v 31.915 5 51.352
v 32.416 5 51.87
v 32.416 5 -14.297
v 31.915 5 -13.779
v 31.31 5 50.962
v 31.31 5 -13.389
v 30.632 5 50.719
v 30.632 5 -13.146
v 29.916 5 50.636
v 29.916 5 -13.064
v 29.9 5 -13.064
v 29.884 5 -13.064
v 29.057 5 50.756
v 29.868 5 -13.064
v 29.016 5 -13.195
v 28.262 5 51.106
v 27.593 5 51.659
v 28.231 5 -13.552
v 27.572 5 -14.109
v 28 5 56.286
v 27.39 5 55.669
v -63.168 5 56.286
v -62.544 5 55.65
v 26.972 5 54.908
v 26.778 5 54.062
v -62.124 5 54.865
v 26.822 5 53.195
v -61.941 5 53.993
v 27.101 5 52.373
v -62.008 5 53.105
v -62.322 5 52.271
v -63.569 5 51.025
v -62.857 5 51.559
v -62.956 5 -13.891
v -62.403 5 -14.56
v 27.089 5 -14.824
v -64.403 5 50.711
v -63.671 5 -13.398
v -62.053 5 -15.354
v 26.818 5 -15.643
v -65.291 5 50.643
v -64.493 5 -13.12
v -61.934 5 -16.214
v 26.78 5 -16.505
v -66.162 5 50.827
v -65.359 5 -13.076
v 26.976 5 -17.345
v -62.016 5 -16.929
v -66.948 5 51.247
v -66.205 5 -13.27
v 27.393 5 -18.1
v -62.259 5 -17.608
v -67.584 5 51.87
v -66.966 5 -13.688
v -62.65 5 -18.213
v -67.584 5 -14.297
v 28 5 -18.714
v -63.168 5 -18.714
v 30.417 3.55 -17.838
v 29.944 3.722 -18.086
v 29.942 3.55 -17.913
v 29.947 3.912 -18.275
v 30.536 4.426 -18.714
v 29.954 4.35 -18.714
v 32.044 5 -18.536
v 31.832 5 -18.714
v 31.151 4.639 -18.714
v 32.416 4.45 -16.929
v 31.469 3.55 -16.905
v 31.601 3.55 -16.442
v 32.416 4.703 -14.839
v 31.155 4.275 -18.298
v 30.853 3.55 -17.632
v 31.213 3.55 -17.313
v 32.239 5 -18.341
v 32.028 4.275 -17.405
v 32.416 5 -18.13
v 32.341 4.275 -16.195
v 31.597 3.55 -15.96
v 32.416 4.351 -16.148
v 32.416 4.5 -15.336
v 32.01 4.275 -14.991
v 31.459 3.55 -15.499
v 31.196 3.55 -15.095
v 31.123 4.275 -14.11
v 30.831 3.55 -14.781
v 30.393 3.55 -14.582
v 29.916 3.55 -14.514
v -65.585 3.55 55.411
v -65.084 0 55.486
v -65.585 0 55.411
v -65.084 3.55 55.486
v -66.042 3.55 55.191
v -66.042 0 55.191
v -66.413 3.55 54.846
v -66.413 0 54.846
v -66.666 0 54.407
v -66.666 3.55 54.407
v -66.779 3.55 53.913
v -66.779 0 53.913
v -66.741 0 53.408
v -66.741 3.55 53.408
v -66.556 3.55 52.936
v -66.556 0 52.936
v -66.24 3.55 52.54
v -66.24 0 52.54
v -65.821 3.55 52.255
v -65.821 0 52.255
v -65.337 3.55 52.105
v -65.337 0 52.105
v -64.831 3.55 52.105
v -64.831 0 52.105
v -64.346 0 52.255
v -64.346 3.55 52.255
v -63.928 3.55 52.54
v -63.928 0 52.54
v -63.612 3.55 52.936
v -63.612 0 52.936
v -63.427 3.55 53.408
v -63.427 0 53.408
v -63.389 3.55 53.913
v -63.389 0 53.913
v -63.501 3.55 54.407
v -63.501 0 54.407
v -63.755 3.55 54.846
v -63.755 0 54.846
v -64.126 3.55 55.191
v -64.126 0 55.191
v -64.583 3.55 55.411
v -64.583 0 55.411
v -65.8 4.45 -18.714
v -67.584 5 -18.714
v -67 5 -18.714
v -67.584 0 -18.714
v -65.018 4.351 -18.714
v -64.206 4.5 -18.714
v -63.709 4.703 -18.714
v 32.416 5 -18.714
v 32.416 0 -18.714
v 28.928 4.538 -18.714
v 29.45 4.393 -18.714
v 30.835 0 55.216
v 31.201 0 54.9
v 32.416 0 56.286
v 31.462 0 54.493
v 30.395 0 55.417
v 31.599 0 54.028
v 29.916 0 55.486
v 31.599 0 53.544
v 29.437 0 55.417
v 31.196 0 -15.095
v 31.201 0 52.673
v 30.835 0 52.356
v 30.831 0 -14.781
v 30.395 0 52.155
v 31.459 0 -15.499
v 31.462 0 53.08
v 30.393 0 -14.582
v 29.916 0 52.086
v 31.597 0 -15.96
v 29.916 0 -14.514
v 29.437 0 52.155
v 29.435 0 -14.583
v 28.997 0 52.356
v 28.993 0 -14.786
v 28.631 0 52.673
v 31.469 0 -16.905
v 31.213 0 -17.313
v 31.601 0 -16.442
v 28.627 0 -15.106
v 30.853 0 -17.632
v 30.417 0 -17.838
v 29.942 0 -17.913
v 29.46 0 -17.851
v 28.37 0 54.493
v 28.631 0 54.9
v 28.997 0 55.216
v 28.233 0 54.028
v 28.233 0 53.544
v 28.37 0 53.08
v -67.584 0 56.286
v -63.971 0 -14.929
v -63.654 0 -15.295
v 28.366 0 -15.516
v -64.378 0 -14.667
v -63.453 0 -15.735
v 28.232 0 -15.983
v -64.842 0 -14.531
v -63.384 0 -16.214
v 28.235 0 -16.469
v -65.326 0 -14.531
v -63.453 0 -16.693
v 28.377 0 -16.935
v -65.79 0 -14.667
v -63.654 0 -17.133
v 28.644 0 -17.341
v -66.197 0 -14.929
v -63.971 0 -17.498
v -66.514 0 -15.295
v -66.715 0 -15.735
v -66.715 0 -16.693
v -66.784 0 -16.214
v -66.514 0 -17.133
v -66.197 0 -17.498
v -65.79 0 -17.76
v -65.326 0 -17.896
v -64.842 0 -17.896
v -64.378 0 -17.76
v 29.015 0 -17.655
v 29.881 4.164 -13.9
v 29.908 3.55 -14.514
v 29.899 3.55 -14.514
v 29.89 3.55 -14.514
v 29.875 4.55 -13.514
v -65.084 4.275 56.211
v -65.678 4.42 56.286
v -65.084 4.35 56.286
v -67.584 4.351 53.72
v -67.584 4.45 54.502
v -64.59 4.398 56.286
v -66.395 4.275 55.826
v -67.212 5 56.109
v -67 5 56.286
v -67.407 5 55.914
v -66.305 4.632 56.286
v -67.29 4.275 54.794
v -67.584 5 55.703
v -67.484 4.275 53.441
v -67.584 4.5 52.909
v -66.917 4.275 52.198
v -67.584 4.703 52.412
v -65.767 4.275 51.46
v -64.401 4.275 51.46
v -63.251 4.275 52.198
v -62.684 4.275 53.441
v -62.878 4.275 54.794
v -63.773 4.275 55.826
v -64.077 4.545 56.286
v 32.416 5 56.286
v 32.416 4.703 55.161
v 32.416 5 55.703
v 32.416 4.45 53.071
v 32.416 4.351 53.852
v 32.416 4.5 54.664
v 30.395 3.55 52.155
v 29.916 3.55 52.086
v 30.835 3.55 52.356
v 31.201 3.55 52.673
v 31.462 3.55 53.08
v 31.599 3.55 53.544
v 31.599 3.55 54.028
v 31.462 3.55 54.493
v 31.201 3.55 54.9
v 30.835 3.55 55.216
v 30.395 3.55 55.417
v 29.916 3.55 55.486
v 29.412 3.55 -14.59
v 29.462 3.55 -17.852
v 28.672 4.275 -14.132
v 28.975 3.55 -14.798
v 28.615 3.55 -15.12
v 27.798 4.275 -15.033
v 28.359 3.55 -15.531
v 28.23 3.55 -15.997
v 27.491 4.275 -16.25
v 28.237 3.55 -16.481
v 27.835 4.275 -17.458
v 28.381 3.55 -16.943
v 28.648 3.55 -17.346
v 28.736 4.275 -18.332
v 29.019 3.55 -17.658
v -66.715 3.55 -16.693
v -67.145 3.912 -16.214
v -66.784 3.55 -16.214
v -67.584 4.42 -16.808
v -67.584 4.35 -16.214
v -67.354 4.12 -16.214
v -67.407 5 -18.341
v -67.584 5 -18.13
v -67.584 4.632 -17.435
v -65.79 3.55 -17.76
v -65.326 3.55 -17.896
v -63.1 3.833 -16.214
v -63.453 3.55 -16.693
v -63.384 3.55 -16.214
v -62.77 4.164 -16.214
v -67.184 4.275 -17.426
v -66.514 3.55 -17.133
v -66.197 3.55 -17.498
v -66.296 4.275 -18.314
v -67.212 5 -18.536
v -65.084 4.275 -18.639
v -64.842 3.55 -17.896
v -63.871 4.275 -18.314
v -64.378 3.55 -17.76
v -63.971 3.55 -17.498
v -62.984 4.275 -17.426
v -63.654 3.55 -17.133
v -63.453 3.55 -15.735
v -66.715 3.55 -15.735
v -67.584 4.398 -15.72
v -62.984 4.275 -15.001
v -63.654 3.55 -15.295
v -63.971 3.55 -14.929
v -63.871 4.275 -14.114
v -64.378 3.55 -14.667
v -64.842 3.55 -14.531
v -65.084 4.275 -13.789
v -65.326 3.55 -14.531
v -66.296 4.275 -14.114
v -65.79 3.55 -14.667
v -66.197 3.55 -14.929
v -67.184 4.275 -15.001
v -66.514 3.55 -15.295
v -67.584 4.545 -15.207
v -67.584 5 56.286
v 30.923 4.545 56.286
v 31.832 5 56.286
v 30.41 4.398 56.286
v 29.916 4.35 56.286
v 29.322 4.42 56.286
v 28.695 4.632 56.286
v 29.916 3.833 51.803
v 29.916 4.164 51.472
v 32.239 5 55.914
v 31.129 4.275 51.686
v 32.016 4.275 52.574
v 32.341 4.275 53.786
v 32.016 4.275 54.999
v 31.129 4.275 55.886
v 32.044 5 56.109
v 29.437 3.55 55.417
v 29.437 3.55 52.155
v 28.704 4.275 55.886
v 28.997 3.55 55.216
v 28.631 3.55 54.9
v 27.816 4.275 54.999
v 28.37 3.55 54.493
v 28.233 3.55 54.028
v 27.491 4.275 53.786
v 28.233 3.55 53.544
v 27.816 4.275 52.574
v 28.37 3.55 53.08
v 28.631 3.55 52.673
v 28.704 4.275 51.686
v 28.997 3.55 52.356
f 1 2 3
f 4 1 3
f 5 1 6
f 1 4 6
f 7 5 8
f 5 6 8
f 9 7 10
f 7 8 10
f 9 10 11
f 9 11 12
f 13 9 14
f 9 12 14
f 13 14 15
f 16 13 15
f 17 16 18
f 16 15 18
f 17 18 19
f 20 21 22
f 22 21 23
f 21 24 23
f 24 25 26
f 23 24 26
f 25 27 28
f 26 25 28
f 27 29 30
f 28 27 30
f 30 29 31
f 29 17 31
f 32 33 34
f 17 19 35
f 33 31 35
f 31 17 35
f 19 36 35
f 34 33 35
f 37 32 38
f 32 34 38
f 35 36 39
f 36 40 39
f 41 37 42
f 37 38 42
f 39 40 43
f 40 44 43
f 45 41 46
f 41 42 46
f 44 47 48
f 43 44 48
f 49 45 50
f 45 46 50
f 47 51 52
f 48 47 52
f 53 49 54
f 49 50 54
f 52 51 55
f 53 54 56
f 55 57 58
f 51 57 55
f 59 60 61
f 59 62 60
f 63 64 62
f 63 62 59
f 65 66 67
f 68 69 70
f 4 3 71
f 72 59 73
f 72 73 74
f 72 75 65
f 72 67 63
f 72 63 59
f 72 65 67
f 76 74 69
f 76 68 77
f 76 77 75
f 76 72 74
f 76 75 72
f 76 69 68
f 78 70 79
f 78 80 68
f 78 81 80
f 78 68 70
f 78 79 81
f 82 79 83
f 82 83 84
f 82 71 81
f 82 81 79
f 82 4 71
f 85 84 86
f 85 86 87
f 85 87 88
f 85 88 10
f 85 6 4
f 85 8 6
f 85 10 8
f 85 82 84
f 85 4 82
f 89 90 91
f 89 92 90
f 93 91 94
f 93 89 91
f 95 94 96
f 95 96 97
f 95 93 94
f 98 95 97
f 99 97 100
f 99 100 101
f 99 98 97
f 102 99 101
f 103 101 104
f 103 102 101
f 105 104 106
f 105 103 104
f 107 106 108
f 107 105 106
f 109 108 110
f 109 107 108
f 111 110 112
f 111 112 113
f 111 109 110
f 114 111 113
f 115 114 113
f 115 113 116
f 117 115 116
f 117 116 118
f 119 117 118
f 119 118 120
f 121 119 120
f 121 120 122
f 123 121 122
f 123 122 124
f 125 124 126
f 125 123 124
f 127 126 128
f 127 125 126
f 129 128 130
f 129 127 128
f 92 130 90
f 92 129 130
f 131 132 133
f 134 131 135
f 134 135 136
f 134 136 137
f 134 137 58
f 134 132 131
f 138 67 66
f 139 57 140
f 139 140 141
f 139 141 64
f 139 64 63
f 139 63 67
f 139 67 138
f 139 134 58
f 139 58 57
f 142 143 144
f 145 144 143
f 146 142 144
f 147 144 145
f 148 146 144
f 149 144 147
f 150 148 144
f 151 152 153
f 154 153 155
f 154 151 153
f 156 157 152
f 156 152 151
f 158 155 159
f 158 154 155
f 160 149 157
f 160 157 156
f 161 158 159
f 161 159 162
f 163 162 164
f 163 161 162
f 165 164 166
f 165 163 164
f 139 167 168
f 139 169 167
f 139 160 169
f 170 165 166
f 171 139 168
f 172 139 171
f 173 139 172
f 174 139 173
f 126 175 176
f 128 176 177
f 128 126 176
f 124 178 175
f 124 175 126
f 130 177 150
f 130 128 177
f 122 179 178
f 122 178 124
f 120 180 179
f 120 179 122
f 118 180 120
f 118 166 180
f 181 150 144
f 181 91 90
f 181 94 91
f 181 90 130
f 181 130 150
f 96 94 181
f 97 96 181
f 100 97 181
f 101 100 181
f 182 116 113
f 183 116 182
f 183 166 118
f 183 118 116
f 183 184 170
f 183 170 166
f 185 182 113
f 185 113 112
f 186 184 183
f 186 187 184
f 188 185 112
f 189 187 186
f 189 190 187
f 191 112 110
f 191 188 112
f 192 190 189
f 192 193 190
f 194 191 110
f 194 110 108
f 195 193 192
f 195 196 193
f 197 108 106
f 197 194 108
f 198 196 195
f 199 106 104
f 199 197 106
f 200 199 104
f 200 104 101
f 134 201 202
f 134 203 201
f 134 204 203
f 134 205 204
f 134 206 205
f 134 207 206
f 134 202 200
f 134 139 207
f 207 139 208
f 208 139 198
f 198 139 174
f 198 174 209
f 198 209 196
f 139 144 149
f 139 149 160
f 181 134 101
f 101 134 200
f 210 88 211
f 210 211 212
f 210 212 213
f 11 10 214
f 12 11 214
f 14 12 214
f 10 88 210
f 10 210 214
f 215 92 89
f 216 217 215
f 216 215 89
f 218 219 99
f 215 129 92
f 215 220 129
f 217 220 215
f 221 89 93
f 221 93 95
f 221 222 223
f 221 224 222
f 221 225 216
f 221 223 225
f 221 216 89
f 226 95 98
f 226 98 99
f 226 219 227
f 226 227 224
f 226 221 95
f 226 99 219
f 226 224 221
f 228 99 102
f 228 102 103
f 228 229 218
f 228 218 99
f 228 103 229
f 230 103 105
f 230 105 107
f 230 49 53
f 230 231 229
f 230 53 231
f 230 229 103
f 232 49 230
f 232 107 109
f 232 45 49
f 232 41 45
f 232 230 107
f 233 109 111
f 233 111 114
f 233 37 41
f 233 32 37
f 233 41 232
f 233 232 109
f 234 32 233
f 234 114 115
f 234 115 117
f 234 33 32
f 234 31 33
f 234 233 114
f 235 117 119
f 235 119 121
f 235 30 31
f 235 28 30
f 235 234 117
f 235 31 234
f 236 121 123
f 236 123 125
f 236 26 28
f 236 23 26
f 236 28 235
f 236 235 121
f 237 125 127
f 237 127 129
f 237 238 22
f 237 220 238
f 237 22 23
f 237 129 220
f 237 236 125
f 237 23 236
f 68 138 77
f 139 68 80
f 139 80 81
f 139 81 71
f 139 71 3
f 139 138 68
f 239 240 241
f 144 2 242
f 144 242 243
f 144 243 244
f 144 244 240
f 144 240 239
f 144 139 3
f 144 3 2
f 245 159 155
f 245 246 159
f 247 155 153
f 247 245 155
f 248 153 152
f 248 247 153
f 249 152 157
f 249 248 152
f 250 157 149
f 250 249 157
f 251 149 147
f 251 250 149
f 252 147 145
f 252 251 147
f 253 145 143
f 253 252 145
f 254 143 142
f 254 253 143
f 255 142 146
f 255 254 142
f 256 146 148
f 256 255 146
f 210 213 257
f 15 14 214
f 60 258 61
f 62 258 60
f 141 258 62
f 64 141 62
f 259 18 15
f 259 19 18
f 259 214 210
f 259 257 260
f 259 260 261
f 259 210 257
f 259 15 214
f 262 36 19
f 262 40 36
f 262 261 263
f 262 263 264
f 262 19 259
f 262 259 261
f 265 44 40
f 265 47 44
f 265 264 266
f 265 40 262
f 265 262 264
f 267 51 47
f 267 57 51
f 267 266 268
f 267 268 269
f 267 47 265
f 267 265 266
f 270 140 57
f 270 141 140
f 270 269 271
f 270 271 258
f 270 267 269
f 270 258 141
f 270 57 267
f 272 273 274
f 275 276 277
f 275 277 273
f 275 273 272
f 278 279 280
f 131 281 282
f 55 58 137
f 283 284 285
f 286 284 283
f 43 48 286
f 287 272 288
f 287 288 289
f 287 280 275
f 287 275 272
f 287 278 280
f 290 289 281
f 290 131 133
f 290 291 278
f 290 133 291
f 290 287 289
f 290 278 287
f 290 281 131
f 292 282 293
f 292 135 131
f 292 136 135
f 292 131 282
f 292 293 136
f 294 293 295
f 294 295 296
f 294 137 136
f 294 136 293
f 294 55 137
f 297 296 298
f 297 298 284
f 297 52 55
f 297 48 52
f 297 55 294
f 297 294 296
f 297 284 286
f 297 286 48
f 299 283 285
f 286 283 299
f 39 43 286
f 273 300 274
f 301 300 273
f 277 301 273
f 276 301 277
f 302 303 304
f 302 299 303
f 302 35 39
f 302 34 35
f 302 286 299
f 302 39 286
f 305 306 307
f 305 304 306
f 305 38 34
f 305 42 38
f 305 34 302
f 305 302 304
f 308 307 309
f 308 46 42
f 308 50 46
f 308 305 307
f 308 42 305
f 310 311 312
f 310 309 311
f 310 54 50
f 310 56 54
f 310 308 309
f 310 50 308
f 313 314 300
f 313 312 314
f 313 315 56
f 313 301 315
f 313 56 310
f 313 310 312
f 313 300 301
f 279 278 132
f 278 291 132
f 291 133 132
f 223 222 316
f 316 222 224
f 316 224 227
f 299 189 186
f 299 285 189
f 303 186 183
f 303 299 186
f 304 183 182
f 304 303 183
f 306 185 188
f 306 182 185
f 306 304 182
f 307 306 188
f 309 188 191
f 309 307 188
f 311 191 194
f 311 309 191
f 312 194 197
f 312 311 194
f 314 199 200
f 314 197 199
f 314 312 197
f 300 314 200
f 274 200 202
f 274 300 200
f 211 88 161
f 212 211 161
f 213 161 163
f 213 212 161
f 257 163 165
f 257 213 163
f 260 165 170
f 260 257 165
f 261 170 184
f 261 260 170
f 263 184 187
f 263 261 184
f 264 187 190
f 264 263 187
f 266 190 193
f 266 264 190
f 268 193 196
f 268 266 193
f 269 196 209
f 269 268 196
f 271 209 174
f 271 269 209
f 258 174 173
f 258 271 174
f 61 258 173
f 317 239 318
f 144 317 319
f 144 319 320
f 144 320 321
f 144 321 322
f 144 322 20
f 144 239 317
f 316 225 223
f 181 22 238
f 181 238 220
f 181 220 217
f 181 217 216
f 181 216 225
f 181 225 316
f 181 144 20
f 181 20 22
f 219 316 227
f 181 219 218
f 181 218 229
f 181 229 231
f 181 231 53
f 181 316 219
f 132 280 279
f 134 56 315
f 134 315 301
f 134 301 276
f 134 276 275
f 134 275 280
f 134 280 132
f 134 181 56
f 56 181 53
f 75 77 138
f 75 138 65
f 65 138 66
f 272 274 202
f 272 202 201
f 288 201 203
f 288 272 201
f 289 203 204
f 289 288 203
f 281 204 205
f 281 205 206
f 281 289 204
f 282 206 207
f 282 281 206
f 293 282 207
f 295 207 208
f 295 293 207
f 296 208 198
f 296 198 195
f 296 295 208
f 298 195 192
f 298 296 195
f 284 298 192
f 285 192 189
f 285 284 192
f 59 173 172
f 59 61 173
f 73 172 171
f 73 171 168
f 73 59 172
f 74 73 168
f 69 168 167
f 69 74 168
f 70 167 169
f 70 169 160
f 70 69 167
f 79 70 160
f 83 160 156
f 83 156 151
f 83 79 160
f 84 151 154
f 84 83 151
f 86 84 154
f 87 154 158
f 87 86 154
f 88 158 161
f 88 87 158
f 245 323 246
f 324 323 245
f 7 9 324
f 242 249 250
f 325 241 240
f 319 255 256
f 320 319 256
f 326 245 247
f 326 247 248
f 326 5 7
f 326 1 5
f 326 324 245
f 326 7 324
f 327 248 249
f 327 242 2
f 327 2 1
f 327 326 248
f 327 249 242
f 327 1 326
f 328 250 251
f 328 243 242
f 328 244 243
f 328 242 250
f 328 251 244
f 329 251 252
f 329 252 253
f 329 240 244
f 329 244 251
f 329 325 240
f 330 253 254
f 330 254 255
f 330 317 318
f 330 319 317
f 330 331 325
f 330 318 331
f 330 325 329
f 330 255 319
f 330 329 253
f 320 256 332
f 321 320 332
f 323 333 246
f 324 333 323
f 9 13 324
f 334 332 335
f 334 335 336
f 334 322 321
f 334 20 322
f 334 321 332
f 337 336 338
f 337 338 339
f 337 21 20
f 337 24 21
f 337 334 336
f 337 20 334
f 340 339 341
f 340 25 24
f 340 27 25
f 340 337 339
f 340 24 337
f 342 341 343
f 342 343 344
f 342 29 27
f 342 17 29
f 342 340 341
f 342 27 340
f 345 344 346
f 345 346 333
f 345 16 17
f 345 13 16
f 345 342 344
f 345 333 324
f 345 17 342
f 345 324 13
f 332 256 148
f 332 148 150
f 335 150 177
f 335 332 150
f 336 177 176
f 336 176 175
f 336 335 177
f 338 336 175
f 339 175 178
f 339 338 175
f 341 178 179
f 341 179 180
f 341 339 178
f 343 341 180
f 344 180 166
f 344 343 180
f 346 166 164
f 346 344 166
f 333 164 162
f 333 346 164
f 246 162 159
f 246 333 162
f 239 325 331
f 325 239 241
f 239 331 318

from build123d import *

# Parameters (mm, degrees)
SALIENTE_EXTRUIR1_DEPTH                     = 5
AVELLANADO_PARA_TORNILLO_CON_CABEZA_3_COUNT = 2
AVELLANADO_PARA_TORNILLO_CON_CABEZA_3_PITCH = 70
AVELLANADO_PARA_TORNILLO_CON_CABEZA_4_COUNT = 2
AVELLANADO_PARA_TORNILLO_CON_CABEZA_4_PITCH = 118.00423721205946
AVELLANADO_PARA_TORNILLO_CON_CABEZA_5_COUNT = 2
AVELLANADO_PARA_TORNILLO_CON_CABEZA_5_PITCH = 95
AVELLANADO_PARA_TORNILLO_CON_CABEZA_6_COUNT = 2
AVELLANADO_PARA_TORNILLO_CON_CABEZA_6_PITCH = 69.99999670760137
AVELLANADO_PARA_TORNILLO_CON_CABEZA_7_COUNT = 2
AVELLANADO_PARA_TORNILLO_CON_CABEZA_7_PITCH = 118.00424590243654
AVELLANADO_PARA_TORNILLO_CON_CABEZA_8_COUNT = 2
AVELLANADO_PARA_TORNILLO_CON_CABEZA_8_PITCH = 95.00001009358513


with BuildPart() as part:
    # Croquis1 → Saliente-Extruir1 (new body)
    with BuildSketch(Plane(origin=(0, 0, 0), x_dir=(1, 0, 0), z_dir=(0, 1, 0))):
        Polygon((-67.58389261744966, 18.71364653243848), (32.41610738255034, 18.71364653243848), (32.41610738255035, -56.28635346756151), (-67.58389261744965, -56.28635346756151), align=None)
    extrude(amount=SALIENTE_EXTRUIR1_DEPTH)

    # Croquis3 → Avellanado para tornillo con cabeza plana avellanada de M31 (revolve, cut)
    with BuildSketch(Plane(origin=(-65.08389261744965, 5, 53.78635346756151), x_dir=(0, 0, 1), z_dir=(1, 0, 0))):
        Polygon((0, 0), (-1.22e-15, 5.000000000000001), (1.6999999999999986, 5), (1.699999999999999, 1.4500000000000013), (3.15, 0), align=None)
    avellanado_para_tornillo_con_cabeza_plan = revolve(axis=Axis((-65.08389261744965, 11.34999999999999, 53.78635346756151), (0, -1, 0)), mode=Mode.SUBTRACT)

    # Avellanado para tornillo con cabeza  3: Avellanado para tornillo con cabeza plana avellanada de M31 ×2
    with Locations(*[(0, 0, -i * AVELLANADO_PARA_TORNILLO_CON_CABEZA_3_PITCH) for i in range(1, AVELLANADO_PARA_TORNILLO_CON_CABEZA_3_COUNT)]):
        add(avellanado_para_tornillo_con_cabeza_plan, mode=Mode.SUBTRACT)

    # Avellanado para tornillo con cabeza  4: Avellanado para tornillo con cabeza plana avellanada de M31 ×2
    with Locations(*[Vector(0.8050558373533679, 0, -0.5931990380498501) * (i * AVELLANADO_PARA_TORNILLO_CON_CABEZA_4_PITCH) for i in range(1, AVELLANADO_PARA_TORNILLO_CON_CABEZA_4_COUNT)]):
        add(avellanado_para_tornillo_con_cabeza_plan, mode=Mode.SUBTRACT)

    # Avellanado para tornillo con cabeza  5: Avellanado para tornillo con cabeza plana avellanada de M31 ×2
    with Locations(*[(i * AVELLANADO_PARA_TORNILLO_CON_CABEZA_5_PITCH, 0, 0) for i in range(1, AVELLANADO_PARA_TORNILLO_CON_CABEZA_5_COUNT)]):
        add(avellanado_para_tornillo_con_cabeza_plan, mode=Mode.SUBTRACT)

    # Avellanado para tornillo con cabeza  6: Avellanado para tornillo con cabeza plana avellanada de M31 ×2
    with Locations(*[(0, 0, -i * AVELLANADO_PARA_TORNILLO_CON_CABEZA_6_PITCH) for i in range(1, AVELLANADO_PARA_TORNILLO_CON_CABEZA_6_COUNT)]):
        add(avellanado_para_tornillo_con_cabeza_plan, mode=Mode.SUBTRACT)

    # Avellanado para tornillo con cabeza  7: Avellanado para tornillo con cabeza plana avellanada de M31 ×2
    with Locations(*[Vector(0.8050558705764262, 0, -0.5931989929614112) * (i * AVELLANADO_PARA_TORNILLO_CON_CABEZA_7_PITCH) for i in range(1, AVELLANADO_PARA_TORNILLO_CON_CABEZA_7_COUNT)]):
        add(avellanado_para_tornillo_con_cabeza_plan, mode=Mode.SUBTRACT)

    # Avellanado para tornillo con cabeza  8: Avellanado para tornillo con cabeza plana avellanada de M31 ×2
    with Locations(*[(i * AVELLANADO_PARA_TORNILLO_CON_CABEZA_8_PITCH, 0, 0) for i in range(1, AVELLANADO_PARA_TORNILLO_CON_CABEZA_8_COUNT)]):
        add(avellanado_para_tornillo_con_cabeza_plan, mode=Mode.SUBTRACT)


solid = part.part
